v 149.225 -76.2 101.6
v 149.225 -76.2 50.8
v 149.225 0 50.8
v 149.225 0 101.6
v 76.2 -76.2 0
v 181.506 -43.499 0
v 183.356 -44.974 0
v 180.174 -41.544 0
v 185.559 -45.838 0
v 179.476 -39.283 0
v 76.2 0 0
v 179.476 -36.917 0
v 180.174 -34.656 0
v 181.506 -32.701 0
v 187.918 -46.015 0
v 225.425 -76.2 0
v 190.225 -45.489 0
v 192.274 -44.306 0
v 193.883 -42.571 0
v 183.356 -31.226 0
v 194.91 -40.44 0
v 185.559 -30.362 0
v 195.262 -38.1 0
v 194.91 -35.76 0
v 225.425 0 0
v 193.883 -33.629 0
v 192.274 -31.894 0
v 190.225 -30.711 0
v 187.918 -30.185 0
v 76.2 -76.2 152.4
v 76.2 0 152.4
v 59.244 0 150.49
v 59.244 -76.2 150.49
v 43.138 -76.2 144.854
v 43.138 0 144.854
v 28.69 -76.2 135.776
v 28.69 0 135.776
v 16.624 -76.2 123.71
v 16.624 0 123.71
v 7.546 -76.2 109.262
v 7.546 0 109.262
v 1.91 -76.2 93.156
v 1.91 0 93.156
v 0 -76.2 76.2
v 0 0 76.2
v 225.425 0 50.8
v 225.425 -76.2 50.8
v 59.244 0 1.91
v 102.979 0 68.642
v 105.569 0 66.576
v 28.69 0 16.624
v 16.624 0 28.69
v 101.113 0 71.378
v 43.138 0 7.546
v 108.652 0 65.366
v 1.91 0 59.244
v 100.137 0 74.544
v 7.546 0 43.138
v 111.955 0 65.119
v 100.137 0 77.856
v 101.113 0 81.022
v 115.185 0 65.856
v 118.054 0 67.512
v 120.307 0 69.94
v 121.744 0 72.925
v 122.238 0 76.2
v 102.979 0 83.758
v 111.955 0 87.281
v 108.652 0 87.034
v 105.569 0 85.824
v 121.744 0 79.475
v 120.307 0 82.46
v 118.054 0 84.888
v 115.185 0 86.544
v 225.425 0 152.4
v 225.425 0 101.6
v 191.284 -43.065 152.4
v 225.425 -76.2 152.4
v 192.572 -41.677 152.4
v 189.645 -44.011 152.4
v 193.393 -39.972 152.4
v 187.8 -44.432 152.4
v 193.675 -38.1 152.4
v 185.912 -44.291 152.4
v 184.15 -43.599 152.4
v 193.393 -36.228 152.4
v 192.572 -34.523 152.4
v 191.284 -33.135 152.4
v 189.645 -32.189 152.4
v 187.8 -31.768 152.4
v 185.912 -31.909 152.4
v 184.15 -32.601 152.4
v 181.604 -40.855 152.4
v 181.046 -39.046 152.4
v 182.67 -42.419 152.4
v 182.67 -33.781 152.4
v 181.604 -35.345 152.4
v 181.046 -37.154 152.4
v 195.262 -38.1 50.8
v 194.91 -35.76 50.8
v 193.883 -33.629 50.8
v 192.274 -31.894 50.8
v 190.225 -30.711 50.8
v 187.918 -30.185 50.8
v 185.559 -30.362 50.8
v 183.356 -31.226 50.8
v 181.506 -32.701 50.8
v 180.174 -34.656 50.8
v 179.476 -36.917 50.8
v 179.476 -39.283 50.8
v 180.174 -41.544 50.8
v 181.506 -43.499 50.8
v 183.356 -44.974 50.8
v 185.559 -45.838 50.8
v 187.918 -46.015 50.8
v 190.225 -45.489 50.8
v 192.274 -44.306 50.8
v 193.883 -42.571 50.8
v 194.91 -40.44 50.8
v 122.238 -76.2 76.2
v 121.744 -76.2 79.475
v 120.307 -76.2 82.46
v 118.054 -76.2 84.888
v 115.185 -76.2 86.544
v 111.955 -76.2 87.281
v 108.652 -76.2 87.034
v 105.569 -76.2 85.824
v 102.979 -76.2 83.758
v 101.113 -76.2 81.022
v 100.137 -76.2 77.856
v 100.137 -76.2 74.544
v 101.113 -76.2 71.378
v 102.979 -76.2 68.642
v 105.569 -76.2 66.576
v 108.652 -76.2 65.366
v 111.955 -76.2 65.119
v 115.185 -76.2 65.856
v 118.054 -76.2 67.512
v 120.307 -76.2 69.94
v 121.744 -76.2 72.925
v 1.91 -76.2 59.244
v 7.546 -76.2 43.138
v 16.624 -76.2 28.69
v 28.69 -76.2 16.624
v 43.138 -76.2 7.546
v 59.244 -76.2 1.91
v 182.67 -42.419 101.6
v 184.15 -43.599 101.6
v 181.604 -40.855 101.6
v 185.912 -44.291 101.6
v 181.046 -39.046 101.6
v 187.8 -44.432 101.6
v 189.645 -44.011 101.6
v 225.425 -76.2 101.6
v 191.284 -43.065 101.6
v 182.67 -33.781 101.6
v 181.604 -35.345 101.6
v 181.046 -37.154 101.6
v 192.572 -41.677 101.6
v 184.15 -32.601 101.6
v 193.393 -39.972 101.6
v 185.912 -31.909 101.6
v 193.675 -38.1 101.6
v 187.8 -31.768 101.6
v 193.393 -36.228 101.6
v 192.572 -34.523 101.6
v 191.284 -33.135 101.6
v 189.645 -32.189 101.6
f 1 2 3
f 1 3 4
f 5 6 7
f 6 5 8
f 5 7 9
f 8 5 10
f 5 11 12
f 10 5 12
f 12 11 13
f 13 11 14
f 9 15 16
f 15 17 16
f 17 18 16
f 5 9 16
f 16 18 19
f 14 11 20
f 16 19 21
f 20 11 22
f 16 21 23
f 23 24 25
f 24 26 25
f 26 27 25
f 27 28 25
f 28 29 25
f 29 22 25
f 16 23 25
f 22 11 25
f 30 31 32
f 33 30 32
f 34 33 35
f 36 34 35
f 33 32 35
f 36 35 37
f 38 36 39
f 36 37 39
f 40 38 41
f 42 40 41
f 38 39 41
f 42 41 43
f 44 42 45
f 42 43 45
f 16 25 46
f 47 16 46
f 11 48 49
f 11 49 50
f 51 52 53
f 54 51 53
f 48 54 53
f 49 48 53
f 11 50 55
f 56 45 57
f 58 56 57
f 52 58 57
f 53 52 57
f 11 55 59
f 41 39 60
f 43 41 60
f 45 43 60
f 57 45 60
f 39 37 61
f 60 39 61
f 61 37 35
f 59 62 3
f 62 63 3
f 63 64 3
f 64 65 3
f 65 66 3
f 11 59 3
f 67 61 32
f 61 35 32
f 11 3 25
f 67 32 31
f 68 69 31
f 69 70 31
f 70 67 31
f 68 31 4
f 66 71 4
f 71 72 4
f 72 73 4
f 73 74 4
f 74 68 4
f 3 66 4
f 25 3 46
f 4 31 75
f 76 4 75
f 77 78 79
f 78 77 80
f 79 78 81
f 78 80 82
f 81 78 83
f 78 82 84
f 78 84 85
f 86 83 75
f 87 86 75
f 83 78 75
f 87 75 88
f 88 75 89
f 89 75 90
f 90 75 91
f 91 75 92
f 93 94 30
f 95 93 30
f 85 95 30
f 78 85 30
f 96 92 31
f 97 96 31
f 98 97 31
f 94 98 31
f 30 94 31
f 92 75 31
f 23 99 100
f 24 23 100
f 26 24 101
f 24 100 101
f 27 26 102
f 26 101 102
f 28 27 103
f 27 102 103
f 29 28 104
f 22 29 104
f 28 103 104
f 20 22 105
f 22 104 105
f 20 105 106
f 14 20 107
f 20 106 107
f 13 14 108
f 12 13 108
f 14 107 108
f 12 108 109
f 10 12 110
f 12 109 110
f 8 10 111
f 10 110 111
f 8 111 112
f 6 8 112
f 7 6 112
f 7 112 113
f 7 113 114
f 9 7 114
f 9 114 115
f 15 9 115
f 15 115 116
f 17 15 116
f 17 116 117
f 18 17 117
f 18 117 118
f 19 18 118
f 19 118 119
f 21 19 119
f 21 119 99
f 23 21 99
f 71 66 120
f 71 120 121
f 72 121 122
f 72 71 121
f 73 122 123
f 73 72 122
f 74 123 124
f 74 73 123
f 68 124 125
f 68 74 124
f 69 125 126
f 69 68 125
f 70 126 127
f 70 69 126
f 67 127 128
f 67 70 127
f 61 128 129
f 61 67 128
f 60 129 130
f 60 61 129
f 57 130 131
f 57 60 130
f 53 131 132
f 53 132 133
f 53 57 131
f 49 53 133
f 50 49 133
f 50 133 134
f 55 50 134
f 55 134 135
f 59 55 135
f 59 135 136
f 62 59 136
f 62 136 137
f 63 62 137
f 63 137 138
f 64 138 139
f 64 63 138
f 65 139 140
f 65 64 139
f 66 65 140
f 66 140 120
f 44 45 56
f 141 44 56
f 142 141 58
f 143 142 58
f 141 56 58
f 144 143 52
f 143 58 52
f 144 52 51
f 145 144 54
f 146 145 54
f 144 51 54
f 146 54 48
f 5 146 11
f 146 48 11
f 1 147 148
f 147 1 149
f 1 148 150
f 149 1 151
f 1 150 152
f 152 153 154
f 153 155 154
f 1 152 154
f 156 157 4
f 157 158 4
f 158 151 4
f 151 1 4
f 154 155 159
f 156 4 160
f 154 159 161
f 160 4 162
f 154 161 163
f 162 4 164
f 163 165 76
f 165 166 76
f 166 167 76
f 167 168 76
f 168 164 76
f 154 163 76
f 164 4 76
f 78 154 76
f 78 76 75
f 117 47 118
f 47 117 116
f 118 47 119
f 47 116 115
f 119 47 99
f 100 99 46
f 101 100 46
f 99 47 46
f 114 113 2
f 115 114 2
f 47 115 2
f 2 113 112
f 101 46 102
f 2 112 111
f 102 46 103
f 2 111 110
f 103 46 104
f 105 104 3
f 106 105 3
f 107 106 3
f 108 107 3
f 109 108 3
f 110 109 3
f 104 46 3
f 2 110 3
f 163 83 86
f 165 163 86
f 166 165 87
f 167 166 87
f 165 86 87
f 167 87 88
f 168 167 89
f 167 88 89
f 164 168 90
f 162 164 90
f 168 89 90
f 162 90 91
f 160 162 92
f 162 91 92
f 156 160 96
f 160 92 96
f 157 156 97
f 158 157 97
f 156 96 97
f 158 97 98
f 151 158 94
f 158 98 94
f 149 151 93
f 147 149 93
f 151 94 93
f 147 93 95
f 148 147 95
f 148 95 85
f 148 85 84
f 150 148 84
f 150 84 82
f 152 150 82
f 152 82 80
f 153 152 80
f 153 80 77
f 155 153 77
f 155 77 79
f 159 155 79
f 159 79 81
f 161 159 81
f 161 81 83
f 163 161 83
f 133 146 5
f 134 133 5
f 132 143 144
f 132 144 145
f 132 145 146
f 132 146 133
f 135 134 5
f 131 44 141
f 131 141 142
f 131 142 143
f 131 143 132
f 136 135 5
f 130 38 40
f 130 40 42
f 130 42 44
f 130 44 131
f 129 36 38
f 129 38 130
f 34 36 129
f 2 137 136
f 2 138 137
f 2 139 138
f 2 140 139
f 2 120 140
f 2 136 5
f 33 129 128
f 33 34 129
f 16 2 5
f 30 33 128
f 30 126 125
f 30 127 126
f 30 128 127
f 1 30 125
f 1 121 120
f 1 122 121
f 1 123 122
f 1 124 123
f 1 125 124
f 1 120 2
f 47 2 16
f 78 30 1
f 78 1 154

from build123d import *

# Parameters (mm, degrees)
F0_R     = 11.1125
F1_DEPTH = 76.2
F2_R     = 6.35
F3_DEPTH = 81.026
F4_R     = 7.9375
F5_DEPTH = 65.278


with BuildPart() as f1:
    # F0 (on Front) → F1 (new body)
    with BuildSketch(Plane.XZ):
        with BuildLine():
            Line((225.425, 152.4), (76.2, 152.4))
            ThreePointArc((76.2, 152.4), (22.318463, 130.081537), (0, 76.2))
            ThreePointArc((0, 76.2), (22.318463, 22.318463), (76.2, 0))
            Line((76.2, 0), (225.425, 0))
            Line((225.425, 0), (225.425, 50.8))
            Line((225.425, 50.8), (149.225, 50.8))
            Line((149.225, 50.8), (149.225, 101.6))
            Line((149.225, 101.6), (225.425, 101.6))
            Line((225.425, 101.6), (225.425, 152.4))
        make_face()
        with Locations((111.125, 76.2)):
            Circle(F0_R, mode=Mode.SUBTRACT)
    extrude(amount=F1_DEPTH)

    # F2 (on face) → F3 (cut)
    with BuildSketch(Plane.XY.offset(152.4)):
        with Locations((187.325, -38.1)):
            Circle(F2_R)
    extrude(amount=-F3_DEPTH, mode=Mode.SUBTRACT)

    # F4 (on face) → F5 (cut)
    with BuildSketch(Plane.XY.offset(50.8)):
        with Locations((187.325, -38.1)):
            Circle(F4_R)
    extrude(amount=-F5_DEPTH, mode=Mode.SUBTRACT)


solid = f1.part
